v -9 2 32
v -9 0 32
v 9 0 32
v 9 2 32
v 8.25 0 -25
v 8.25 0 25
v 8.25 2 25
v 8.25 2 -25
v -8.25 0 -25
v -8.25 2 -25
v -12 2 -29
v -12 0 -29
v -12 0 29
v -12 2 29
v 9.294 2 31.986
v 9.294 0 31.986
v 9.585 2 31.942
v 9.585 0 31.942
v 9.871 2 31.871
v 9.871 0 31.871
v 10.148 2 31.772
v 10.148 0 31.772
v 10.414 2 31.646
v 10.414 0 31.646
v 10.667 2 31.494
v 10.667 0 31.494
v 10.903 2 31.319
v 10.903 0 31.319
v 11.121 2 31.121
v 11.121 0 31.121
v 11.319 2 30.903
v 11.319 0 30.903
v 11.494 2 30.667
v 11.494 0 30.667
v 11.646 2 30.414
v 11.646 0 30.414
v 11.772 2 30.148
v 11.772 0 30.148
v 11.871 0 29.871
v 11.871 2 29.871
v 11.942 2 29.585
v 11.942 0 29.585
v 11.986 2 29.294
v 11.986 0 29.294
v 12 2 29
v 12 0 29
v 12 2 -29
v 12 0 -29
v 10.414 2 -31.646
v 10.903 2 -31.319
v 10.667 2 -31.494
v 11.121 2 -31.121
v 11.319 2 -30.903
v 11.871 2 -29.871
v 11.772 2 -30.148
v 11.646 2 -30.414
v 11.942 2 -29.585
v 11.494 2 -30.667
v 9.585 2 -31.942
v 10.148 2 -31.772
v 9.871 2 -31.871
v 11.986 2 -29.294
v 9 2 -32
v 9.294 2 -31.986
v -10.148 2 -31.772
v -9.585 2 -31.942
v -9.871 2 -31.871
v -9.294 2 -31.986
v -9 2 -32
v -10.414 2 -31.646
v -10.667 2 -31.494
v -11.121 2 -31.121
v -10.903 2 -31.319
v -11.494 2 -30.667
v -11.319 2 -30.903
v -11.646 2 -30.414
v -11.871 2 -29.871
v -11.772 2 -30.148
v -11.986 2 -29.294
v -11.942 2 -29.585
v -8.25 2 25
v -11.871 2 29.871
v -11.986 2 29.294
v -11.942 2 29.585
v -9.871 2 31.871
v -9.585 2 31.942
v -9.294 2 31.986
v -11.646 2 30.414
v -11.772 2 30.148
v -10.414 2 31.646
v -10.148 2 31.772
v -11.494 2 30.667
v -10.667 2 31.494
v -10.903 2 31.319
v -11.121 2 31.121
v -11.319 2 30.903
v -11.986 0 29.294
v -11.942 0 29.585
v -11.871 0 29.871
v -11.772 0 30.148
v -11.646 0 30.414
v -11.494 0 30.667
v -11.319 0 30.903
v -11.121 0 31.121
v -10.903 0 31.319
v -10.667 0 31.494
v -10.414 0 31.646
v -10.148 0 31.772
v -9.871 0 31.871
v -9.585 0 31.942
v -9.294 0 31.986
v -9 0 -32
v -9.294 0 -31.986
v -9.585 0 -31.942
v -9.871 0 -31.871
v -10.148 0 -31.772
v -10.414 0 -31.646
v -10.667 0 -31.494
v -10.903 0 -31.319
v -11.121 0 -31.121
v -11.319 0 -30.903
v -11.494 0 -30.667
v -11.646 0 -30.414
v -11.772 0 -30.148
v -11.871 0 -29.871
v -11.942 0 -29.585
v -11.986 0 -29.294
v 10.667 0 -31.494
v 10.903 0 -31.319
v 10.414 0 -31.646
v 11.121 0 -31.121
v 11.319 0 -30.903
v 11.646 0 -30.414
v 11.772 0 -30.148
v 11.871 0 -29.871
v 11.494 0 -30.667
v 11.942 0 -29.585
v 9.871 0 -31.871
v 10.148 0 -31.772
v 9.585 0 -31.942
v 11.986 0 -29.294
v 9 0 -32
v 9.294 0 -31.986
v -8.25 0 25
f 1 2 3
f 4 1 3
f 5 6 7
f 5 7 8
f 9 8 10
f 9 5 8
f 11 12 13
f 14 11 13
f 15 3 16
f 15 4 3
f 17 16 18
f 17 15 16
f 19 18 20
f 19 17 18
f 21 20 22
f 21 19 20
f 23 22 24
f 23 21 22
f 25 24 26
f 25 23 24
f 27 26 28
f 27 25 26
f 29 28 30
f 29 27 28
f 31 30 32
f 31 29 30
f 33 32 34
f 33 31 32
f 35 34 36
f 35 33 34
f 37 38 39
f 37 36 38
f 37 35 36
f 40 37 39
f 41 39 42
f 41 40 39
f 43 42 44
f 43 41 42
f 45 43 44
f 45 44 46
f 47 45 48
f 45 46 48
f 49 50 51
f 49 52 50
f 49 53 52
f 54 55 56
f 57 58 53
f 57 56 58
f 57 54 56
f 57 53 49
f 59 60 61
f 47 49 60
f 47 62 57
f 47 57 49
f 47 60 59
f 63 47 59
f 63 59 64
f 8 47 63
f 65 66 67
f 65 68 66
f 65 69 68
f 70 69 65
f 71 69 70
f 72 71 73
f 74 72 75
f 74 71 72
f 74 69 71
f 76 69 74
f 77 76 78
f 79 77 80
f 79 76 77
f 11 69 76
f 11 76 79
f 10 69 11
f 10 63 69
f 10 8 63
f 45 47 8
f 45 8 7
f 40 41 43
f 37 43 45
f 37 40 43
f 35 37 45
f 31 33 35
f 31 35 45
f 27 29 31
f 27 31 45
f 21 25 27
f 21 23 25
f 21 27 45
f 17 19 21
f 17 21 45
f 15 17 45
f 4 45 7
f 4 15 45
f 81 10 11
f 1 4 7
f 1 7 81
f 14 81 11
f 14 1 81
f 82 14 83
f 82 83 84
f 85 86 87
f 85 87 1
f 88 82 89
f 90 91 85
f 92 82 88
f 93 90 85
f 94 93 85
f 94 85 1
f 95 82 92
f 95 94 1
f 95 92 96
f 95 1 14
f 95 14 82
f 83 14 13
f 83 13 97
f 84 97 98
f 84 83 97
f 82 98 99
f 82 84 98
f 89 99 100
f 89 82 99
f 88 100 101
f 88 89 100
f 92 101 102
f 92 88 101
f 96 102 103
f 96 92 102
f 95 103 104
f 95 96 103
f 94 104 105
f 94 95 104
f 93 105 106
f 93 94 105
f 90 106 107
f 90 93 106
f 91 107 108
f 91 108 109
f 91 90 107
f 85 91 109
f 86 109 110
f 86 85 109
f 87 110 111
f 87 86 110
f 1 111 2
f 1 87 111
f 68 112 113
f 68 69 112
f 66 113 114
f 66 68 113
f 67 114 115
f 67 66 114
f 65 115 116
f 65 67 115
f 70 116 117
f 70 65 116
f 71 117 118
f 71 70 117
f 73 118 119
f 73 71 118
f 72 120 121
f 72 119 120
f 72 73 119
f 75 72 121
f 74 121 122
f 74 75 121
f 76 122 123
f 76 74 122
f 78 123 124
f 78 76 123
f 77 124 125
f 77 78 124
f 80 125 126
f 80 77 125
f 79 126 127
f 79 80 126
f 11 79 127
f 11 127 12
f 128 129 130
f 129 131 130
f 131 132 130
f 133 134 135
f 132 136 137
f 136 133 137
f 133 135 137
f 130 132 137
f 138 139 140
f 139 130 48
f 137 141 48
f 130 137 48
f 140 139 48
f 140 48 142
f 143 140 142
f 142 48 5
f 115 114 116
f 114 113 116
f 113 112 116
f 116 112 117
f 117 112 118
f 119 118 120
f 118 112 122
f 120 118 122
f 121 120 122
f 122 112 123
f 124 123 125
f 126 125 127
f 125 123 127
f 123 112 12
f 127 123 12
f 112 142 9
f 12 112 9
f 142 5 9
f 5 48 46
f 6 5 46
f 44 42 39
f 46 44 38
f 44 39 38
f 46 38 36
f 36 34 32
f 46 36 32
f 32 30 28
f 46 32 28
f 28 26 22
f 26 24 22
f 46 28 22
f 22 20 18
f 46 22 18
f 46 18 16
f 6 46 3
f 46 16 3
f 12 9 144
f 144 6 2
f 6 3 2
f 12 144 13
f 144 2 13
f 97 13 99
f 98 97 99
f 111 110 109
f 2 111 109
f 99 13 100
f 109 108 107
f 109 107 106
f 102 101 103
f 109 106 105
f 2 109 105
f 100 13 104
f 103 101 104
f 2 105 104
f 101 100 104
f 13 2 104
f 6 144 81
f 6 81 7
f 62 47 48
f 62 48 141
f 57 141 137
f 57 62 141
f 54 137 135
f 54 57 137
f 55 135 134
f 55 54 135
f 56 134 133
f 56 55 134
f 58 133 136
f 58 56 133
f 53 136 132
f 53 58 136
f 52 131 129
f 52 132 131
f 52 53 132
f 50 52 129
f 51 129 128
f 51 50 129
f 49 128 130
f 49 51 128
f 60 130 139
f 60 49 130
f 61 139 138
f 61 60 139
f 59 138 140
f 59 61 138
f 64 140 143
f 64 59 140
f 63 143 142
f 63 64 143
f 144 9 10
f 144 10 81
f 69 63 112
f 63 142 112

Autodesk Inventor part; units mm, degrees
ref_plane "YZ Plane" through (0, 0, 0) normal (1, 0, 0) x (0, 1, 0)
ref_plane "XZ Plane" through (0, 0, 0) normal (0, 1, 0) x (-1, 0, 0)
ref_plane "XY Plane" through (0, 0, 0) normal (0, 0, 1) x (1, 0, 0)
sketch "スケッチ1" plane through (0, 0, 0) normal (0, 1, 0) x (-1, 0, 0)
  line L0 (12, 32) -> (-12, 32)
  line L1 (-12, 32) -> (-12, -32)
  line L2 (-12, -32) -> (12, -32)
  line L3 (12, -32) -> (12, 32)
  line L4 (12, 32) -> (-12, -32) construction
  line L5 (-12, 32) -> (12, -32) construction
  line L6 (8.25, 25) -> (-8.25, 25)
  line L7 (-8.25, 25) -> (-8.25, -25)
  line L8 (-8.25, -25) -> (8.25, -25)
  line L9 (8.25, -25) -> (8.25, 25)
  line L10 (8.25, 25) -> (-8.25, -25) construction
  line L11 (-8.25, 25) -> (8.25, -25) construction
  point P0 (0, 0)
  dimension "d0" = 24
  dimension "d1" = 64
  dimension "d2" = 16.5
  dimension "d3" = 50
extrude "押し出し1" add sketch "スケッチ1" along normal blind 2
sketch "スケッチ2" plane through (0, 2, 0) normal (0, 1, 0) x (1, 0, 0)
  point P0 (0, 0)
fillet "フィレット1" radius 3 4 edges at (-12, 1, 32) (12, 1, 32) (12, 1, -32) (-12, 1, -32)
properties part number "bottom"
